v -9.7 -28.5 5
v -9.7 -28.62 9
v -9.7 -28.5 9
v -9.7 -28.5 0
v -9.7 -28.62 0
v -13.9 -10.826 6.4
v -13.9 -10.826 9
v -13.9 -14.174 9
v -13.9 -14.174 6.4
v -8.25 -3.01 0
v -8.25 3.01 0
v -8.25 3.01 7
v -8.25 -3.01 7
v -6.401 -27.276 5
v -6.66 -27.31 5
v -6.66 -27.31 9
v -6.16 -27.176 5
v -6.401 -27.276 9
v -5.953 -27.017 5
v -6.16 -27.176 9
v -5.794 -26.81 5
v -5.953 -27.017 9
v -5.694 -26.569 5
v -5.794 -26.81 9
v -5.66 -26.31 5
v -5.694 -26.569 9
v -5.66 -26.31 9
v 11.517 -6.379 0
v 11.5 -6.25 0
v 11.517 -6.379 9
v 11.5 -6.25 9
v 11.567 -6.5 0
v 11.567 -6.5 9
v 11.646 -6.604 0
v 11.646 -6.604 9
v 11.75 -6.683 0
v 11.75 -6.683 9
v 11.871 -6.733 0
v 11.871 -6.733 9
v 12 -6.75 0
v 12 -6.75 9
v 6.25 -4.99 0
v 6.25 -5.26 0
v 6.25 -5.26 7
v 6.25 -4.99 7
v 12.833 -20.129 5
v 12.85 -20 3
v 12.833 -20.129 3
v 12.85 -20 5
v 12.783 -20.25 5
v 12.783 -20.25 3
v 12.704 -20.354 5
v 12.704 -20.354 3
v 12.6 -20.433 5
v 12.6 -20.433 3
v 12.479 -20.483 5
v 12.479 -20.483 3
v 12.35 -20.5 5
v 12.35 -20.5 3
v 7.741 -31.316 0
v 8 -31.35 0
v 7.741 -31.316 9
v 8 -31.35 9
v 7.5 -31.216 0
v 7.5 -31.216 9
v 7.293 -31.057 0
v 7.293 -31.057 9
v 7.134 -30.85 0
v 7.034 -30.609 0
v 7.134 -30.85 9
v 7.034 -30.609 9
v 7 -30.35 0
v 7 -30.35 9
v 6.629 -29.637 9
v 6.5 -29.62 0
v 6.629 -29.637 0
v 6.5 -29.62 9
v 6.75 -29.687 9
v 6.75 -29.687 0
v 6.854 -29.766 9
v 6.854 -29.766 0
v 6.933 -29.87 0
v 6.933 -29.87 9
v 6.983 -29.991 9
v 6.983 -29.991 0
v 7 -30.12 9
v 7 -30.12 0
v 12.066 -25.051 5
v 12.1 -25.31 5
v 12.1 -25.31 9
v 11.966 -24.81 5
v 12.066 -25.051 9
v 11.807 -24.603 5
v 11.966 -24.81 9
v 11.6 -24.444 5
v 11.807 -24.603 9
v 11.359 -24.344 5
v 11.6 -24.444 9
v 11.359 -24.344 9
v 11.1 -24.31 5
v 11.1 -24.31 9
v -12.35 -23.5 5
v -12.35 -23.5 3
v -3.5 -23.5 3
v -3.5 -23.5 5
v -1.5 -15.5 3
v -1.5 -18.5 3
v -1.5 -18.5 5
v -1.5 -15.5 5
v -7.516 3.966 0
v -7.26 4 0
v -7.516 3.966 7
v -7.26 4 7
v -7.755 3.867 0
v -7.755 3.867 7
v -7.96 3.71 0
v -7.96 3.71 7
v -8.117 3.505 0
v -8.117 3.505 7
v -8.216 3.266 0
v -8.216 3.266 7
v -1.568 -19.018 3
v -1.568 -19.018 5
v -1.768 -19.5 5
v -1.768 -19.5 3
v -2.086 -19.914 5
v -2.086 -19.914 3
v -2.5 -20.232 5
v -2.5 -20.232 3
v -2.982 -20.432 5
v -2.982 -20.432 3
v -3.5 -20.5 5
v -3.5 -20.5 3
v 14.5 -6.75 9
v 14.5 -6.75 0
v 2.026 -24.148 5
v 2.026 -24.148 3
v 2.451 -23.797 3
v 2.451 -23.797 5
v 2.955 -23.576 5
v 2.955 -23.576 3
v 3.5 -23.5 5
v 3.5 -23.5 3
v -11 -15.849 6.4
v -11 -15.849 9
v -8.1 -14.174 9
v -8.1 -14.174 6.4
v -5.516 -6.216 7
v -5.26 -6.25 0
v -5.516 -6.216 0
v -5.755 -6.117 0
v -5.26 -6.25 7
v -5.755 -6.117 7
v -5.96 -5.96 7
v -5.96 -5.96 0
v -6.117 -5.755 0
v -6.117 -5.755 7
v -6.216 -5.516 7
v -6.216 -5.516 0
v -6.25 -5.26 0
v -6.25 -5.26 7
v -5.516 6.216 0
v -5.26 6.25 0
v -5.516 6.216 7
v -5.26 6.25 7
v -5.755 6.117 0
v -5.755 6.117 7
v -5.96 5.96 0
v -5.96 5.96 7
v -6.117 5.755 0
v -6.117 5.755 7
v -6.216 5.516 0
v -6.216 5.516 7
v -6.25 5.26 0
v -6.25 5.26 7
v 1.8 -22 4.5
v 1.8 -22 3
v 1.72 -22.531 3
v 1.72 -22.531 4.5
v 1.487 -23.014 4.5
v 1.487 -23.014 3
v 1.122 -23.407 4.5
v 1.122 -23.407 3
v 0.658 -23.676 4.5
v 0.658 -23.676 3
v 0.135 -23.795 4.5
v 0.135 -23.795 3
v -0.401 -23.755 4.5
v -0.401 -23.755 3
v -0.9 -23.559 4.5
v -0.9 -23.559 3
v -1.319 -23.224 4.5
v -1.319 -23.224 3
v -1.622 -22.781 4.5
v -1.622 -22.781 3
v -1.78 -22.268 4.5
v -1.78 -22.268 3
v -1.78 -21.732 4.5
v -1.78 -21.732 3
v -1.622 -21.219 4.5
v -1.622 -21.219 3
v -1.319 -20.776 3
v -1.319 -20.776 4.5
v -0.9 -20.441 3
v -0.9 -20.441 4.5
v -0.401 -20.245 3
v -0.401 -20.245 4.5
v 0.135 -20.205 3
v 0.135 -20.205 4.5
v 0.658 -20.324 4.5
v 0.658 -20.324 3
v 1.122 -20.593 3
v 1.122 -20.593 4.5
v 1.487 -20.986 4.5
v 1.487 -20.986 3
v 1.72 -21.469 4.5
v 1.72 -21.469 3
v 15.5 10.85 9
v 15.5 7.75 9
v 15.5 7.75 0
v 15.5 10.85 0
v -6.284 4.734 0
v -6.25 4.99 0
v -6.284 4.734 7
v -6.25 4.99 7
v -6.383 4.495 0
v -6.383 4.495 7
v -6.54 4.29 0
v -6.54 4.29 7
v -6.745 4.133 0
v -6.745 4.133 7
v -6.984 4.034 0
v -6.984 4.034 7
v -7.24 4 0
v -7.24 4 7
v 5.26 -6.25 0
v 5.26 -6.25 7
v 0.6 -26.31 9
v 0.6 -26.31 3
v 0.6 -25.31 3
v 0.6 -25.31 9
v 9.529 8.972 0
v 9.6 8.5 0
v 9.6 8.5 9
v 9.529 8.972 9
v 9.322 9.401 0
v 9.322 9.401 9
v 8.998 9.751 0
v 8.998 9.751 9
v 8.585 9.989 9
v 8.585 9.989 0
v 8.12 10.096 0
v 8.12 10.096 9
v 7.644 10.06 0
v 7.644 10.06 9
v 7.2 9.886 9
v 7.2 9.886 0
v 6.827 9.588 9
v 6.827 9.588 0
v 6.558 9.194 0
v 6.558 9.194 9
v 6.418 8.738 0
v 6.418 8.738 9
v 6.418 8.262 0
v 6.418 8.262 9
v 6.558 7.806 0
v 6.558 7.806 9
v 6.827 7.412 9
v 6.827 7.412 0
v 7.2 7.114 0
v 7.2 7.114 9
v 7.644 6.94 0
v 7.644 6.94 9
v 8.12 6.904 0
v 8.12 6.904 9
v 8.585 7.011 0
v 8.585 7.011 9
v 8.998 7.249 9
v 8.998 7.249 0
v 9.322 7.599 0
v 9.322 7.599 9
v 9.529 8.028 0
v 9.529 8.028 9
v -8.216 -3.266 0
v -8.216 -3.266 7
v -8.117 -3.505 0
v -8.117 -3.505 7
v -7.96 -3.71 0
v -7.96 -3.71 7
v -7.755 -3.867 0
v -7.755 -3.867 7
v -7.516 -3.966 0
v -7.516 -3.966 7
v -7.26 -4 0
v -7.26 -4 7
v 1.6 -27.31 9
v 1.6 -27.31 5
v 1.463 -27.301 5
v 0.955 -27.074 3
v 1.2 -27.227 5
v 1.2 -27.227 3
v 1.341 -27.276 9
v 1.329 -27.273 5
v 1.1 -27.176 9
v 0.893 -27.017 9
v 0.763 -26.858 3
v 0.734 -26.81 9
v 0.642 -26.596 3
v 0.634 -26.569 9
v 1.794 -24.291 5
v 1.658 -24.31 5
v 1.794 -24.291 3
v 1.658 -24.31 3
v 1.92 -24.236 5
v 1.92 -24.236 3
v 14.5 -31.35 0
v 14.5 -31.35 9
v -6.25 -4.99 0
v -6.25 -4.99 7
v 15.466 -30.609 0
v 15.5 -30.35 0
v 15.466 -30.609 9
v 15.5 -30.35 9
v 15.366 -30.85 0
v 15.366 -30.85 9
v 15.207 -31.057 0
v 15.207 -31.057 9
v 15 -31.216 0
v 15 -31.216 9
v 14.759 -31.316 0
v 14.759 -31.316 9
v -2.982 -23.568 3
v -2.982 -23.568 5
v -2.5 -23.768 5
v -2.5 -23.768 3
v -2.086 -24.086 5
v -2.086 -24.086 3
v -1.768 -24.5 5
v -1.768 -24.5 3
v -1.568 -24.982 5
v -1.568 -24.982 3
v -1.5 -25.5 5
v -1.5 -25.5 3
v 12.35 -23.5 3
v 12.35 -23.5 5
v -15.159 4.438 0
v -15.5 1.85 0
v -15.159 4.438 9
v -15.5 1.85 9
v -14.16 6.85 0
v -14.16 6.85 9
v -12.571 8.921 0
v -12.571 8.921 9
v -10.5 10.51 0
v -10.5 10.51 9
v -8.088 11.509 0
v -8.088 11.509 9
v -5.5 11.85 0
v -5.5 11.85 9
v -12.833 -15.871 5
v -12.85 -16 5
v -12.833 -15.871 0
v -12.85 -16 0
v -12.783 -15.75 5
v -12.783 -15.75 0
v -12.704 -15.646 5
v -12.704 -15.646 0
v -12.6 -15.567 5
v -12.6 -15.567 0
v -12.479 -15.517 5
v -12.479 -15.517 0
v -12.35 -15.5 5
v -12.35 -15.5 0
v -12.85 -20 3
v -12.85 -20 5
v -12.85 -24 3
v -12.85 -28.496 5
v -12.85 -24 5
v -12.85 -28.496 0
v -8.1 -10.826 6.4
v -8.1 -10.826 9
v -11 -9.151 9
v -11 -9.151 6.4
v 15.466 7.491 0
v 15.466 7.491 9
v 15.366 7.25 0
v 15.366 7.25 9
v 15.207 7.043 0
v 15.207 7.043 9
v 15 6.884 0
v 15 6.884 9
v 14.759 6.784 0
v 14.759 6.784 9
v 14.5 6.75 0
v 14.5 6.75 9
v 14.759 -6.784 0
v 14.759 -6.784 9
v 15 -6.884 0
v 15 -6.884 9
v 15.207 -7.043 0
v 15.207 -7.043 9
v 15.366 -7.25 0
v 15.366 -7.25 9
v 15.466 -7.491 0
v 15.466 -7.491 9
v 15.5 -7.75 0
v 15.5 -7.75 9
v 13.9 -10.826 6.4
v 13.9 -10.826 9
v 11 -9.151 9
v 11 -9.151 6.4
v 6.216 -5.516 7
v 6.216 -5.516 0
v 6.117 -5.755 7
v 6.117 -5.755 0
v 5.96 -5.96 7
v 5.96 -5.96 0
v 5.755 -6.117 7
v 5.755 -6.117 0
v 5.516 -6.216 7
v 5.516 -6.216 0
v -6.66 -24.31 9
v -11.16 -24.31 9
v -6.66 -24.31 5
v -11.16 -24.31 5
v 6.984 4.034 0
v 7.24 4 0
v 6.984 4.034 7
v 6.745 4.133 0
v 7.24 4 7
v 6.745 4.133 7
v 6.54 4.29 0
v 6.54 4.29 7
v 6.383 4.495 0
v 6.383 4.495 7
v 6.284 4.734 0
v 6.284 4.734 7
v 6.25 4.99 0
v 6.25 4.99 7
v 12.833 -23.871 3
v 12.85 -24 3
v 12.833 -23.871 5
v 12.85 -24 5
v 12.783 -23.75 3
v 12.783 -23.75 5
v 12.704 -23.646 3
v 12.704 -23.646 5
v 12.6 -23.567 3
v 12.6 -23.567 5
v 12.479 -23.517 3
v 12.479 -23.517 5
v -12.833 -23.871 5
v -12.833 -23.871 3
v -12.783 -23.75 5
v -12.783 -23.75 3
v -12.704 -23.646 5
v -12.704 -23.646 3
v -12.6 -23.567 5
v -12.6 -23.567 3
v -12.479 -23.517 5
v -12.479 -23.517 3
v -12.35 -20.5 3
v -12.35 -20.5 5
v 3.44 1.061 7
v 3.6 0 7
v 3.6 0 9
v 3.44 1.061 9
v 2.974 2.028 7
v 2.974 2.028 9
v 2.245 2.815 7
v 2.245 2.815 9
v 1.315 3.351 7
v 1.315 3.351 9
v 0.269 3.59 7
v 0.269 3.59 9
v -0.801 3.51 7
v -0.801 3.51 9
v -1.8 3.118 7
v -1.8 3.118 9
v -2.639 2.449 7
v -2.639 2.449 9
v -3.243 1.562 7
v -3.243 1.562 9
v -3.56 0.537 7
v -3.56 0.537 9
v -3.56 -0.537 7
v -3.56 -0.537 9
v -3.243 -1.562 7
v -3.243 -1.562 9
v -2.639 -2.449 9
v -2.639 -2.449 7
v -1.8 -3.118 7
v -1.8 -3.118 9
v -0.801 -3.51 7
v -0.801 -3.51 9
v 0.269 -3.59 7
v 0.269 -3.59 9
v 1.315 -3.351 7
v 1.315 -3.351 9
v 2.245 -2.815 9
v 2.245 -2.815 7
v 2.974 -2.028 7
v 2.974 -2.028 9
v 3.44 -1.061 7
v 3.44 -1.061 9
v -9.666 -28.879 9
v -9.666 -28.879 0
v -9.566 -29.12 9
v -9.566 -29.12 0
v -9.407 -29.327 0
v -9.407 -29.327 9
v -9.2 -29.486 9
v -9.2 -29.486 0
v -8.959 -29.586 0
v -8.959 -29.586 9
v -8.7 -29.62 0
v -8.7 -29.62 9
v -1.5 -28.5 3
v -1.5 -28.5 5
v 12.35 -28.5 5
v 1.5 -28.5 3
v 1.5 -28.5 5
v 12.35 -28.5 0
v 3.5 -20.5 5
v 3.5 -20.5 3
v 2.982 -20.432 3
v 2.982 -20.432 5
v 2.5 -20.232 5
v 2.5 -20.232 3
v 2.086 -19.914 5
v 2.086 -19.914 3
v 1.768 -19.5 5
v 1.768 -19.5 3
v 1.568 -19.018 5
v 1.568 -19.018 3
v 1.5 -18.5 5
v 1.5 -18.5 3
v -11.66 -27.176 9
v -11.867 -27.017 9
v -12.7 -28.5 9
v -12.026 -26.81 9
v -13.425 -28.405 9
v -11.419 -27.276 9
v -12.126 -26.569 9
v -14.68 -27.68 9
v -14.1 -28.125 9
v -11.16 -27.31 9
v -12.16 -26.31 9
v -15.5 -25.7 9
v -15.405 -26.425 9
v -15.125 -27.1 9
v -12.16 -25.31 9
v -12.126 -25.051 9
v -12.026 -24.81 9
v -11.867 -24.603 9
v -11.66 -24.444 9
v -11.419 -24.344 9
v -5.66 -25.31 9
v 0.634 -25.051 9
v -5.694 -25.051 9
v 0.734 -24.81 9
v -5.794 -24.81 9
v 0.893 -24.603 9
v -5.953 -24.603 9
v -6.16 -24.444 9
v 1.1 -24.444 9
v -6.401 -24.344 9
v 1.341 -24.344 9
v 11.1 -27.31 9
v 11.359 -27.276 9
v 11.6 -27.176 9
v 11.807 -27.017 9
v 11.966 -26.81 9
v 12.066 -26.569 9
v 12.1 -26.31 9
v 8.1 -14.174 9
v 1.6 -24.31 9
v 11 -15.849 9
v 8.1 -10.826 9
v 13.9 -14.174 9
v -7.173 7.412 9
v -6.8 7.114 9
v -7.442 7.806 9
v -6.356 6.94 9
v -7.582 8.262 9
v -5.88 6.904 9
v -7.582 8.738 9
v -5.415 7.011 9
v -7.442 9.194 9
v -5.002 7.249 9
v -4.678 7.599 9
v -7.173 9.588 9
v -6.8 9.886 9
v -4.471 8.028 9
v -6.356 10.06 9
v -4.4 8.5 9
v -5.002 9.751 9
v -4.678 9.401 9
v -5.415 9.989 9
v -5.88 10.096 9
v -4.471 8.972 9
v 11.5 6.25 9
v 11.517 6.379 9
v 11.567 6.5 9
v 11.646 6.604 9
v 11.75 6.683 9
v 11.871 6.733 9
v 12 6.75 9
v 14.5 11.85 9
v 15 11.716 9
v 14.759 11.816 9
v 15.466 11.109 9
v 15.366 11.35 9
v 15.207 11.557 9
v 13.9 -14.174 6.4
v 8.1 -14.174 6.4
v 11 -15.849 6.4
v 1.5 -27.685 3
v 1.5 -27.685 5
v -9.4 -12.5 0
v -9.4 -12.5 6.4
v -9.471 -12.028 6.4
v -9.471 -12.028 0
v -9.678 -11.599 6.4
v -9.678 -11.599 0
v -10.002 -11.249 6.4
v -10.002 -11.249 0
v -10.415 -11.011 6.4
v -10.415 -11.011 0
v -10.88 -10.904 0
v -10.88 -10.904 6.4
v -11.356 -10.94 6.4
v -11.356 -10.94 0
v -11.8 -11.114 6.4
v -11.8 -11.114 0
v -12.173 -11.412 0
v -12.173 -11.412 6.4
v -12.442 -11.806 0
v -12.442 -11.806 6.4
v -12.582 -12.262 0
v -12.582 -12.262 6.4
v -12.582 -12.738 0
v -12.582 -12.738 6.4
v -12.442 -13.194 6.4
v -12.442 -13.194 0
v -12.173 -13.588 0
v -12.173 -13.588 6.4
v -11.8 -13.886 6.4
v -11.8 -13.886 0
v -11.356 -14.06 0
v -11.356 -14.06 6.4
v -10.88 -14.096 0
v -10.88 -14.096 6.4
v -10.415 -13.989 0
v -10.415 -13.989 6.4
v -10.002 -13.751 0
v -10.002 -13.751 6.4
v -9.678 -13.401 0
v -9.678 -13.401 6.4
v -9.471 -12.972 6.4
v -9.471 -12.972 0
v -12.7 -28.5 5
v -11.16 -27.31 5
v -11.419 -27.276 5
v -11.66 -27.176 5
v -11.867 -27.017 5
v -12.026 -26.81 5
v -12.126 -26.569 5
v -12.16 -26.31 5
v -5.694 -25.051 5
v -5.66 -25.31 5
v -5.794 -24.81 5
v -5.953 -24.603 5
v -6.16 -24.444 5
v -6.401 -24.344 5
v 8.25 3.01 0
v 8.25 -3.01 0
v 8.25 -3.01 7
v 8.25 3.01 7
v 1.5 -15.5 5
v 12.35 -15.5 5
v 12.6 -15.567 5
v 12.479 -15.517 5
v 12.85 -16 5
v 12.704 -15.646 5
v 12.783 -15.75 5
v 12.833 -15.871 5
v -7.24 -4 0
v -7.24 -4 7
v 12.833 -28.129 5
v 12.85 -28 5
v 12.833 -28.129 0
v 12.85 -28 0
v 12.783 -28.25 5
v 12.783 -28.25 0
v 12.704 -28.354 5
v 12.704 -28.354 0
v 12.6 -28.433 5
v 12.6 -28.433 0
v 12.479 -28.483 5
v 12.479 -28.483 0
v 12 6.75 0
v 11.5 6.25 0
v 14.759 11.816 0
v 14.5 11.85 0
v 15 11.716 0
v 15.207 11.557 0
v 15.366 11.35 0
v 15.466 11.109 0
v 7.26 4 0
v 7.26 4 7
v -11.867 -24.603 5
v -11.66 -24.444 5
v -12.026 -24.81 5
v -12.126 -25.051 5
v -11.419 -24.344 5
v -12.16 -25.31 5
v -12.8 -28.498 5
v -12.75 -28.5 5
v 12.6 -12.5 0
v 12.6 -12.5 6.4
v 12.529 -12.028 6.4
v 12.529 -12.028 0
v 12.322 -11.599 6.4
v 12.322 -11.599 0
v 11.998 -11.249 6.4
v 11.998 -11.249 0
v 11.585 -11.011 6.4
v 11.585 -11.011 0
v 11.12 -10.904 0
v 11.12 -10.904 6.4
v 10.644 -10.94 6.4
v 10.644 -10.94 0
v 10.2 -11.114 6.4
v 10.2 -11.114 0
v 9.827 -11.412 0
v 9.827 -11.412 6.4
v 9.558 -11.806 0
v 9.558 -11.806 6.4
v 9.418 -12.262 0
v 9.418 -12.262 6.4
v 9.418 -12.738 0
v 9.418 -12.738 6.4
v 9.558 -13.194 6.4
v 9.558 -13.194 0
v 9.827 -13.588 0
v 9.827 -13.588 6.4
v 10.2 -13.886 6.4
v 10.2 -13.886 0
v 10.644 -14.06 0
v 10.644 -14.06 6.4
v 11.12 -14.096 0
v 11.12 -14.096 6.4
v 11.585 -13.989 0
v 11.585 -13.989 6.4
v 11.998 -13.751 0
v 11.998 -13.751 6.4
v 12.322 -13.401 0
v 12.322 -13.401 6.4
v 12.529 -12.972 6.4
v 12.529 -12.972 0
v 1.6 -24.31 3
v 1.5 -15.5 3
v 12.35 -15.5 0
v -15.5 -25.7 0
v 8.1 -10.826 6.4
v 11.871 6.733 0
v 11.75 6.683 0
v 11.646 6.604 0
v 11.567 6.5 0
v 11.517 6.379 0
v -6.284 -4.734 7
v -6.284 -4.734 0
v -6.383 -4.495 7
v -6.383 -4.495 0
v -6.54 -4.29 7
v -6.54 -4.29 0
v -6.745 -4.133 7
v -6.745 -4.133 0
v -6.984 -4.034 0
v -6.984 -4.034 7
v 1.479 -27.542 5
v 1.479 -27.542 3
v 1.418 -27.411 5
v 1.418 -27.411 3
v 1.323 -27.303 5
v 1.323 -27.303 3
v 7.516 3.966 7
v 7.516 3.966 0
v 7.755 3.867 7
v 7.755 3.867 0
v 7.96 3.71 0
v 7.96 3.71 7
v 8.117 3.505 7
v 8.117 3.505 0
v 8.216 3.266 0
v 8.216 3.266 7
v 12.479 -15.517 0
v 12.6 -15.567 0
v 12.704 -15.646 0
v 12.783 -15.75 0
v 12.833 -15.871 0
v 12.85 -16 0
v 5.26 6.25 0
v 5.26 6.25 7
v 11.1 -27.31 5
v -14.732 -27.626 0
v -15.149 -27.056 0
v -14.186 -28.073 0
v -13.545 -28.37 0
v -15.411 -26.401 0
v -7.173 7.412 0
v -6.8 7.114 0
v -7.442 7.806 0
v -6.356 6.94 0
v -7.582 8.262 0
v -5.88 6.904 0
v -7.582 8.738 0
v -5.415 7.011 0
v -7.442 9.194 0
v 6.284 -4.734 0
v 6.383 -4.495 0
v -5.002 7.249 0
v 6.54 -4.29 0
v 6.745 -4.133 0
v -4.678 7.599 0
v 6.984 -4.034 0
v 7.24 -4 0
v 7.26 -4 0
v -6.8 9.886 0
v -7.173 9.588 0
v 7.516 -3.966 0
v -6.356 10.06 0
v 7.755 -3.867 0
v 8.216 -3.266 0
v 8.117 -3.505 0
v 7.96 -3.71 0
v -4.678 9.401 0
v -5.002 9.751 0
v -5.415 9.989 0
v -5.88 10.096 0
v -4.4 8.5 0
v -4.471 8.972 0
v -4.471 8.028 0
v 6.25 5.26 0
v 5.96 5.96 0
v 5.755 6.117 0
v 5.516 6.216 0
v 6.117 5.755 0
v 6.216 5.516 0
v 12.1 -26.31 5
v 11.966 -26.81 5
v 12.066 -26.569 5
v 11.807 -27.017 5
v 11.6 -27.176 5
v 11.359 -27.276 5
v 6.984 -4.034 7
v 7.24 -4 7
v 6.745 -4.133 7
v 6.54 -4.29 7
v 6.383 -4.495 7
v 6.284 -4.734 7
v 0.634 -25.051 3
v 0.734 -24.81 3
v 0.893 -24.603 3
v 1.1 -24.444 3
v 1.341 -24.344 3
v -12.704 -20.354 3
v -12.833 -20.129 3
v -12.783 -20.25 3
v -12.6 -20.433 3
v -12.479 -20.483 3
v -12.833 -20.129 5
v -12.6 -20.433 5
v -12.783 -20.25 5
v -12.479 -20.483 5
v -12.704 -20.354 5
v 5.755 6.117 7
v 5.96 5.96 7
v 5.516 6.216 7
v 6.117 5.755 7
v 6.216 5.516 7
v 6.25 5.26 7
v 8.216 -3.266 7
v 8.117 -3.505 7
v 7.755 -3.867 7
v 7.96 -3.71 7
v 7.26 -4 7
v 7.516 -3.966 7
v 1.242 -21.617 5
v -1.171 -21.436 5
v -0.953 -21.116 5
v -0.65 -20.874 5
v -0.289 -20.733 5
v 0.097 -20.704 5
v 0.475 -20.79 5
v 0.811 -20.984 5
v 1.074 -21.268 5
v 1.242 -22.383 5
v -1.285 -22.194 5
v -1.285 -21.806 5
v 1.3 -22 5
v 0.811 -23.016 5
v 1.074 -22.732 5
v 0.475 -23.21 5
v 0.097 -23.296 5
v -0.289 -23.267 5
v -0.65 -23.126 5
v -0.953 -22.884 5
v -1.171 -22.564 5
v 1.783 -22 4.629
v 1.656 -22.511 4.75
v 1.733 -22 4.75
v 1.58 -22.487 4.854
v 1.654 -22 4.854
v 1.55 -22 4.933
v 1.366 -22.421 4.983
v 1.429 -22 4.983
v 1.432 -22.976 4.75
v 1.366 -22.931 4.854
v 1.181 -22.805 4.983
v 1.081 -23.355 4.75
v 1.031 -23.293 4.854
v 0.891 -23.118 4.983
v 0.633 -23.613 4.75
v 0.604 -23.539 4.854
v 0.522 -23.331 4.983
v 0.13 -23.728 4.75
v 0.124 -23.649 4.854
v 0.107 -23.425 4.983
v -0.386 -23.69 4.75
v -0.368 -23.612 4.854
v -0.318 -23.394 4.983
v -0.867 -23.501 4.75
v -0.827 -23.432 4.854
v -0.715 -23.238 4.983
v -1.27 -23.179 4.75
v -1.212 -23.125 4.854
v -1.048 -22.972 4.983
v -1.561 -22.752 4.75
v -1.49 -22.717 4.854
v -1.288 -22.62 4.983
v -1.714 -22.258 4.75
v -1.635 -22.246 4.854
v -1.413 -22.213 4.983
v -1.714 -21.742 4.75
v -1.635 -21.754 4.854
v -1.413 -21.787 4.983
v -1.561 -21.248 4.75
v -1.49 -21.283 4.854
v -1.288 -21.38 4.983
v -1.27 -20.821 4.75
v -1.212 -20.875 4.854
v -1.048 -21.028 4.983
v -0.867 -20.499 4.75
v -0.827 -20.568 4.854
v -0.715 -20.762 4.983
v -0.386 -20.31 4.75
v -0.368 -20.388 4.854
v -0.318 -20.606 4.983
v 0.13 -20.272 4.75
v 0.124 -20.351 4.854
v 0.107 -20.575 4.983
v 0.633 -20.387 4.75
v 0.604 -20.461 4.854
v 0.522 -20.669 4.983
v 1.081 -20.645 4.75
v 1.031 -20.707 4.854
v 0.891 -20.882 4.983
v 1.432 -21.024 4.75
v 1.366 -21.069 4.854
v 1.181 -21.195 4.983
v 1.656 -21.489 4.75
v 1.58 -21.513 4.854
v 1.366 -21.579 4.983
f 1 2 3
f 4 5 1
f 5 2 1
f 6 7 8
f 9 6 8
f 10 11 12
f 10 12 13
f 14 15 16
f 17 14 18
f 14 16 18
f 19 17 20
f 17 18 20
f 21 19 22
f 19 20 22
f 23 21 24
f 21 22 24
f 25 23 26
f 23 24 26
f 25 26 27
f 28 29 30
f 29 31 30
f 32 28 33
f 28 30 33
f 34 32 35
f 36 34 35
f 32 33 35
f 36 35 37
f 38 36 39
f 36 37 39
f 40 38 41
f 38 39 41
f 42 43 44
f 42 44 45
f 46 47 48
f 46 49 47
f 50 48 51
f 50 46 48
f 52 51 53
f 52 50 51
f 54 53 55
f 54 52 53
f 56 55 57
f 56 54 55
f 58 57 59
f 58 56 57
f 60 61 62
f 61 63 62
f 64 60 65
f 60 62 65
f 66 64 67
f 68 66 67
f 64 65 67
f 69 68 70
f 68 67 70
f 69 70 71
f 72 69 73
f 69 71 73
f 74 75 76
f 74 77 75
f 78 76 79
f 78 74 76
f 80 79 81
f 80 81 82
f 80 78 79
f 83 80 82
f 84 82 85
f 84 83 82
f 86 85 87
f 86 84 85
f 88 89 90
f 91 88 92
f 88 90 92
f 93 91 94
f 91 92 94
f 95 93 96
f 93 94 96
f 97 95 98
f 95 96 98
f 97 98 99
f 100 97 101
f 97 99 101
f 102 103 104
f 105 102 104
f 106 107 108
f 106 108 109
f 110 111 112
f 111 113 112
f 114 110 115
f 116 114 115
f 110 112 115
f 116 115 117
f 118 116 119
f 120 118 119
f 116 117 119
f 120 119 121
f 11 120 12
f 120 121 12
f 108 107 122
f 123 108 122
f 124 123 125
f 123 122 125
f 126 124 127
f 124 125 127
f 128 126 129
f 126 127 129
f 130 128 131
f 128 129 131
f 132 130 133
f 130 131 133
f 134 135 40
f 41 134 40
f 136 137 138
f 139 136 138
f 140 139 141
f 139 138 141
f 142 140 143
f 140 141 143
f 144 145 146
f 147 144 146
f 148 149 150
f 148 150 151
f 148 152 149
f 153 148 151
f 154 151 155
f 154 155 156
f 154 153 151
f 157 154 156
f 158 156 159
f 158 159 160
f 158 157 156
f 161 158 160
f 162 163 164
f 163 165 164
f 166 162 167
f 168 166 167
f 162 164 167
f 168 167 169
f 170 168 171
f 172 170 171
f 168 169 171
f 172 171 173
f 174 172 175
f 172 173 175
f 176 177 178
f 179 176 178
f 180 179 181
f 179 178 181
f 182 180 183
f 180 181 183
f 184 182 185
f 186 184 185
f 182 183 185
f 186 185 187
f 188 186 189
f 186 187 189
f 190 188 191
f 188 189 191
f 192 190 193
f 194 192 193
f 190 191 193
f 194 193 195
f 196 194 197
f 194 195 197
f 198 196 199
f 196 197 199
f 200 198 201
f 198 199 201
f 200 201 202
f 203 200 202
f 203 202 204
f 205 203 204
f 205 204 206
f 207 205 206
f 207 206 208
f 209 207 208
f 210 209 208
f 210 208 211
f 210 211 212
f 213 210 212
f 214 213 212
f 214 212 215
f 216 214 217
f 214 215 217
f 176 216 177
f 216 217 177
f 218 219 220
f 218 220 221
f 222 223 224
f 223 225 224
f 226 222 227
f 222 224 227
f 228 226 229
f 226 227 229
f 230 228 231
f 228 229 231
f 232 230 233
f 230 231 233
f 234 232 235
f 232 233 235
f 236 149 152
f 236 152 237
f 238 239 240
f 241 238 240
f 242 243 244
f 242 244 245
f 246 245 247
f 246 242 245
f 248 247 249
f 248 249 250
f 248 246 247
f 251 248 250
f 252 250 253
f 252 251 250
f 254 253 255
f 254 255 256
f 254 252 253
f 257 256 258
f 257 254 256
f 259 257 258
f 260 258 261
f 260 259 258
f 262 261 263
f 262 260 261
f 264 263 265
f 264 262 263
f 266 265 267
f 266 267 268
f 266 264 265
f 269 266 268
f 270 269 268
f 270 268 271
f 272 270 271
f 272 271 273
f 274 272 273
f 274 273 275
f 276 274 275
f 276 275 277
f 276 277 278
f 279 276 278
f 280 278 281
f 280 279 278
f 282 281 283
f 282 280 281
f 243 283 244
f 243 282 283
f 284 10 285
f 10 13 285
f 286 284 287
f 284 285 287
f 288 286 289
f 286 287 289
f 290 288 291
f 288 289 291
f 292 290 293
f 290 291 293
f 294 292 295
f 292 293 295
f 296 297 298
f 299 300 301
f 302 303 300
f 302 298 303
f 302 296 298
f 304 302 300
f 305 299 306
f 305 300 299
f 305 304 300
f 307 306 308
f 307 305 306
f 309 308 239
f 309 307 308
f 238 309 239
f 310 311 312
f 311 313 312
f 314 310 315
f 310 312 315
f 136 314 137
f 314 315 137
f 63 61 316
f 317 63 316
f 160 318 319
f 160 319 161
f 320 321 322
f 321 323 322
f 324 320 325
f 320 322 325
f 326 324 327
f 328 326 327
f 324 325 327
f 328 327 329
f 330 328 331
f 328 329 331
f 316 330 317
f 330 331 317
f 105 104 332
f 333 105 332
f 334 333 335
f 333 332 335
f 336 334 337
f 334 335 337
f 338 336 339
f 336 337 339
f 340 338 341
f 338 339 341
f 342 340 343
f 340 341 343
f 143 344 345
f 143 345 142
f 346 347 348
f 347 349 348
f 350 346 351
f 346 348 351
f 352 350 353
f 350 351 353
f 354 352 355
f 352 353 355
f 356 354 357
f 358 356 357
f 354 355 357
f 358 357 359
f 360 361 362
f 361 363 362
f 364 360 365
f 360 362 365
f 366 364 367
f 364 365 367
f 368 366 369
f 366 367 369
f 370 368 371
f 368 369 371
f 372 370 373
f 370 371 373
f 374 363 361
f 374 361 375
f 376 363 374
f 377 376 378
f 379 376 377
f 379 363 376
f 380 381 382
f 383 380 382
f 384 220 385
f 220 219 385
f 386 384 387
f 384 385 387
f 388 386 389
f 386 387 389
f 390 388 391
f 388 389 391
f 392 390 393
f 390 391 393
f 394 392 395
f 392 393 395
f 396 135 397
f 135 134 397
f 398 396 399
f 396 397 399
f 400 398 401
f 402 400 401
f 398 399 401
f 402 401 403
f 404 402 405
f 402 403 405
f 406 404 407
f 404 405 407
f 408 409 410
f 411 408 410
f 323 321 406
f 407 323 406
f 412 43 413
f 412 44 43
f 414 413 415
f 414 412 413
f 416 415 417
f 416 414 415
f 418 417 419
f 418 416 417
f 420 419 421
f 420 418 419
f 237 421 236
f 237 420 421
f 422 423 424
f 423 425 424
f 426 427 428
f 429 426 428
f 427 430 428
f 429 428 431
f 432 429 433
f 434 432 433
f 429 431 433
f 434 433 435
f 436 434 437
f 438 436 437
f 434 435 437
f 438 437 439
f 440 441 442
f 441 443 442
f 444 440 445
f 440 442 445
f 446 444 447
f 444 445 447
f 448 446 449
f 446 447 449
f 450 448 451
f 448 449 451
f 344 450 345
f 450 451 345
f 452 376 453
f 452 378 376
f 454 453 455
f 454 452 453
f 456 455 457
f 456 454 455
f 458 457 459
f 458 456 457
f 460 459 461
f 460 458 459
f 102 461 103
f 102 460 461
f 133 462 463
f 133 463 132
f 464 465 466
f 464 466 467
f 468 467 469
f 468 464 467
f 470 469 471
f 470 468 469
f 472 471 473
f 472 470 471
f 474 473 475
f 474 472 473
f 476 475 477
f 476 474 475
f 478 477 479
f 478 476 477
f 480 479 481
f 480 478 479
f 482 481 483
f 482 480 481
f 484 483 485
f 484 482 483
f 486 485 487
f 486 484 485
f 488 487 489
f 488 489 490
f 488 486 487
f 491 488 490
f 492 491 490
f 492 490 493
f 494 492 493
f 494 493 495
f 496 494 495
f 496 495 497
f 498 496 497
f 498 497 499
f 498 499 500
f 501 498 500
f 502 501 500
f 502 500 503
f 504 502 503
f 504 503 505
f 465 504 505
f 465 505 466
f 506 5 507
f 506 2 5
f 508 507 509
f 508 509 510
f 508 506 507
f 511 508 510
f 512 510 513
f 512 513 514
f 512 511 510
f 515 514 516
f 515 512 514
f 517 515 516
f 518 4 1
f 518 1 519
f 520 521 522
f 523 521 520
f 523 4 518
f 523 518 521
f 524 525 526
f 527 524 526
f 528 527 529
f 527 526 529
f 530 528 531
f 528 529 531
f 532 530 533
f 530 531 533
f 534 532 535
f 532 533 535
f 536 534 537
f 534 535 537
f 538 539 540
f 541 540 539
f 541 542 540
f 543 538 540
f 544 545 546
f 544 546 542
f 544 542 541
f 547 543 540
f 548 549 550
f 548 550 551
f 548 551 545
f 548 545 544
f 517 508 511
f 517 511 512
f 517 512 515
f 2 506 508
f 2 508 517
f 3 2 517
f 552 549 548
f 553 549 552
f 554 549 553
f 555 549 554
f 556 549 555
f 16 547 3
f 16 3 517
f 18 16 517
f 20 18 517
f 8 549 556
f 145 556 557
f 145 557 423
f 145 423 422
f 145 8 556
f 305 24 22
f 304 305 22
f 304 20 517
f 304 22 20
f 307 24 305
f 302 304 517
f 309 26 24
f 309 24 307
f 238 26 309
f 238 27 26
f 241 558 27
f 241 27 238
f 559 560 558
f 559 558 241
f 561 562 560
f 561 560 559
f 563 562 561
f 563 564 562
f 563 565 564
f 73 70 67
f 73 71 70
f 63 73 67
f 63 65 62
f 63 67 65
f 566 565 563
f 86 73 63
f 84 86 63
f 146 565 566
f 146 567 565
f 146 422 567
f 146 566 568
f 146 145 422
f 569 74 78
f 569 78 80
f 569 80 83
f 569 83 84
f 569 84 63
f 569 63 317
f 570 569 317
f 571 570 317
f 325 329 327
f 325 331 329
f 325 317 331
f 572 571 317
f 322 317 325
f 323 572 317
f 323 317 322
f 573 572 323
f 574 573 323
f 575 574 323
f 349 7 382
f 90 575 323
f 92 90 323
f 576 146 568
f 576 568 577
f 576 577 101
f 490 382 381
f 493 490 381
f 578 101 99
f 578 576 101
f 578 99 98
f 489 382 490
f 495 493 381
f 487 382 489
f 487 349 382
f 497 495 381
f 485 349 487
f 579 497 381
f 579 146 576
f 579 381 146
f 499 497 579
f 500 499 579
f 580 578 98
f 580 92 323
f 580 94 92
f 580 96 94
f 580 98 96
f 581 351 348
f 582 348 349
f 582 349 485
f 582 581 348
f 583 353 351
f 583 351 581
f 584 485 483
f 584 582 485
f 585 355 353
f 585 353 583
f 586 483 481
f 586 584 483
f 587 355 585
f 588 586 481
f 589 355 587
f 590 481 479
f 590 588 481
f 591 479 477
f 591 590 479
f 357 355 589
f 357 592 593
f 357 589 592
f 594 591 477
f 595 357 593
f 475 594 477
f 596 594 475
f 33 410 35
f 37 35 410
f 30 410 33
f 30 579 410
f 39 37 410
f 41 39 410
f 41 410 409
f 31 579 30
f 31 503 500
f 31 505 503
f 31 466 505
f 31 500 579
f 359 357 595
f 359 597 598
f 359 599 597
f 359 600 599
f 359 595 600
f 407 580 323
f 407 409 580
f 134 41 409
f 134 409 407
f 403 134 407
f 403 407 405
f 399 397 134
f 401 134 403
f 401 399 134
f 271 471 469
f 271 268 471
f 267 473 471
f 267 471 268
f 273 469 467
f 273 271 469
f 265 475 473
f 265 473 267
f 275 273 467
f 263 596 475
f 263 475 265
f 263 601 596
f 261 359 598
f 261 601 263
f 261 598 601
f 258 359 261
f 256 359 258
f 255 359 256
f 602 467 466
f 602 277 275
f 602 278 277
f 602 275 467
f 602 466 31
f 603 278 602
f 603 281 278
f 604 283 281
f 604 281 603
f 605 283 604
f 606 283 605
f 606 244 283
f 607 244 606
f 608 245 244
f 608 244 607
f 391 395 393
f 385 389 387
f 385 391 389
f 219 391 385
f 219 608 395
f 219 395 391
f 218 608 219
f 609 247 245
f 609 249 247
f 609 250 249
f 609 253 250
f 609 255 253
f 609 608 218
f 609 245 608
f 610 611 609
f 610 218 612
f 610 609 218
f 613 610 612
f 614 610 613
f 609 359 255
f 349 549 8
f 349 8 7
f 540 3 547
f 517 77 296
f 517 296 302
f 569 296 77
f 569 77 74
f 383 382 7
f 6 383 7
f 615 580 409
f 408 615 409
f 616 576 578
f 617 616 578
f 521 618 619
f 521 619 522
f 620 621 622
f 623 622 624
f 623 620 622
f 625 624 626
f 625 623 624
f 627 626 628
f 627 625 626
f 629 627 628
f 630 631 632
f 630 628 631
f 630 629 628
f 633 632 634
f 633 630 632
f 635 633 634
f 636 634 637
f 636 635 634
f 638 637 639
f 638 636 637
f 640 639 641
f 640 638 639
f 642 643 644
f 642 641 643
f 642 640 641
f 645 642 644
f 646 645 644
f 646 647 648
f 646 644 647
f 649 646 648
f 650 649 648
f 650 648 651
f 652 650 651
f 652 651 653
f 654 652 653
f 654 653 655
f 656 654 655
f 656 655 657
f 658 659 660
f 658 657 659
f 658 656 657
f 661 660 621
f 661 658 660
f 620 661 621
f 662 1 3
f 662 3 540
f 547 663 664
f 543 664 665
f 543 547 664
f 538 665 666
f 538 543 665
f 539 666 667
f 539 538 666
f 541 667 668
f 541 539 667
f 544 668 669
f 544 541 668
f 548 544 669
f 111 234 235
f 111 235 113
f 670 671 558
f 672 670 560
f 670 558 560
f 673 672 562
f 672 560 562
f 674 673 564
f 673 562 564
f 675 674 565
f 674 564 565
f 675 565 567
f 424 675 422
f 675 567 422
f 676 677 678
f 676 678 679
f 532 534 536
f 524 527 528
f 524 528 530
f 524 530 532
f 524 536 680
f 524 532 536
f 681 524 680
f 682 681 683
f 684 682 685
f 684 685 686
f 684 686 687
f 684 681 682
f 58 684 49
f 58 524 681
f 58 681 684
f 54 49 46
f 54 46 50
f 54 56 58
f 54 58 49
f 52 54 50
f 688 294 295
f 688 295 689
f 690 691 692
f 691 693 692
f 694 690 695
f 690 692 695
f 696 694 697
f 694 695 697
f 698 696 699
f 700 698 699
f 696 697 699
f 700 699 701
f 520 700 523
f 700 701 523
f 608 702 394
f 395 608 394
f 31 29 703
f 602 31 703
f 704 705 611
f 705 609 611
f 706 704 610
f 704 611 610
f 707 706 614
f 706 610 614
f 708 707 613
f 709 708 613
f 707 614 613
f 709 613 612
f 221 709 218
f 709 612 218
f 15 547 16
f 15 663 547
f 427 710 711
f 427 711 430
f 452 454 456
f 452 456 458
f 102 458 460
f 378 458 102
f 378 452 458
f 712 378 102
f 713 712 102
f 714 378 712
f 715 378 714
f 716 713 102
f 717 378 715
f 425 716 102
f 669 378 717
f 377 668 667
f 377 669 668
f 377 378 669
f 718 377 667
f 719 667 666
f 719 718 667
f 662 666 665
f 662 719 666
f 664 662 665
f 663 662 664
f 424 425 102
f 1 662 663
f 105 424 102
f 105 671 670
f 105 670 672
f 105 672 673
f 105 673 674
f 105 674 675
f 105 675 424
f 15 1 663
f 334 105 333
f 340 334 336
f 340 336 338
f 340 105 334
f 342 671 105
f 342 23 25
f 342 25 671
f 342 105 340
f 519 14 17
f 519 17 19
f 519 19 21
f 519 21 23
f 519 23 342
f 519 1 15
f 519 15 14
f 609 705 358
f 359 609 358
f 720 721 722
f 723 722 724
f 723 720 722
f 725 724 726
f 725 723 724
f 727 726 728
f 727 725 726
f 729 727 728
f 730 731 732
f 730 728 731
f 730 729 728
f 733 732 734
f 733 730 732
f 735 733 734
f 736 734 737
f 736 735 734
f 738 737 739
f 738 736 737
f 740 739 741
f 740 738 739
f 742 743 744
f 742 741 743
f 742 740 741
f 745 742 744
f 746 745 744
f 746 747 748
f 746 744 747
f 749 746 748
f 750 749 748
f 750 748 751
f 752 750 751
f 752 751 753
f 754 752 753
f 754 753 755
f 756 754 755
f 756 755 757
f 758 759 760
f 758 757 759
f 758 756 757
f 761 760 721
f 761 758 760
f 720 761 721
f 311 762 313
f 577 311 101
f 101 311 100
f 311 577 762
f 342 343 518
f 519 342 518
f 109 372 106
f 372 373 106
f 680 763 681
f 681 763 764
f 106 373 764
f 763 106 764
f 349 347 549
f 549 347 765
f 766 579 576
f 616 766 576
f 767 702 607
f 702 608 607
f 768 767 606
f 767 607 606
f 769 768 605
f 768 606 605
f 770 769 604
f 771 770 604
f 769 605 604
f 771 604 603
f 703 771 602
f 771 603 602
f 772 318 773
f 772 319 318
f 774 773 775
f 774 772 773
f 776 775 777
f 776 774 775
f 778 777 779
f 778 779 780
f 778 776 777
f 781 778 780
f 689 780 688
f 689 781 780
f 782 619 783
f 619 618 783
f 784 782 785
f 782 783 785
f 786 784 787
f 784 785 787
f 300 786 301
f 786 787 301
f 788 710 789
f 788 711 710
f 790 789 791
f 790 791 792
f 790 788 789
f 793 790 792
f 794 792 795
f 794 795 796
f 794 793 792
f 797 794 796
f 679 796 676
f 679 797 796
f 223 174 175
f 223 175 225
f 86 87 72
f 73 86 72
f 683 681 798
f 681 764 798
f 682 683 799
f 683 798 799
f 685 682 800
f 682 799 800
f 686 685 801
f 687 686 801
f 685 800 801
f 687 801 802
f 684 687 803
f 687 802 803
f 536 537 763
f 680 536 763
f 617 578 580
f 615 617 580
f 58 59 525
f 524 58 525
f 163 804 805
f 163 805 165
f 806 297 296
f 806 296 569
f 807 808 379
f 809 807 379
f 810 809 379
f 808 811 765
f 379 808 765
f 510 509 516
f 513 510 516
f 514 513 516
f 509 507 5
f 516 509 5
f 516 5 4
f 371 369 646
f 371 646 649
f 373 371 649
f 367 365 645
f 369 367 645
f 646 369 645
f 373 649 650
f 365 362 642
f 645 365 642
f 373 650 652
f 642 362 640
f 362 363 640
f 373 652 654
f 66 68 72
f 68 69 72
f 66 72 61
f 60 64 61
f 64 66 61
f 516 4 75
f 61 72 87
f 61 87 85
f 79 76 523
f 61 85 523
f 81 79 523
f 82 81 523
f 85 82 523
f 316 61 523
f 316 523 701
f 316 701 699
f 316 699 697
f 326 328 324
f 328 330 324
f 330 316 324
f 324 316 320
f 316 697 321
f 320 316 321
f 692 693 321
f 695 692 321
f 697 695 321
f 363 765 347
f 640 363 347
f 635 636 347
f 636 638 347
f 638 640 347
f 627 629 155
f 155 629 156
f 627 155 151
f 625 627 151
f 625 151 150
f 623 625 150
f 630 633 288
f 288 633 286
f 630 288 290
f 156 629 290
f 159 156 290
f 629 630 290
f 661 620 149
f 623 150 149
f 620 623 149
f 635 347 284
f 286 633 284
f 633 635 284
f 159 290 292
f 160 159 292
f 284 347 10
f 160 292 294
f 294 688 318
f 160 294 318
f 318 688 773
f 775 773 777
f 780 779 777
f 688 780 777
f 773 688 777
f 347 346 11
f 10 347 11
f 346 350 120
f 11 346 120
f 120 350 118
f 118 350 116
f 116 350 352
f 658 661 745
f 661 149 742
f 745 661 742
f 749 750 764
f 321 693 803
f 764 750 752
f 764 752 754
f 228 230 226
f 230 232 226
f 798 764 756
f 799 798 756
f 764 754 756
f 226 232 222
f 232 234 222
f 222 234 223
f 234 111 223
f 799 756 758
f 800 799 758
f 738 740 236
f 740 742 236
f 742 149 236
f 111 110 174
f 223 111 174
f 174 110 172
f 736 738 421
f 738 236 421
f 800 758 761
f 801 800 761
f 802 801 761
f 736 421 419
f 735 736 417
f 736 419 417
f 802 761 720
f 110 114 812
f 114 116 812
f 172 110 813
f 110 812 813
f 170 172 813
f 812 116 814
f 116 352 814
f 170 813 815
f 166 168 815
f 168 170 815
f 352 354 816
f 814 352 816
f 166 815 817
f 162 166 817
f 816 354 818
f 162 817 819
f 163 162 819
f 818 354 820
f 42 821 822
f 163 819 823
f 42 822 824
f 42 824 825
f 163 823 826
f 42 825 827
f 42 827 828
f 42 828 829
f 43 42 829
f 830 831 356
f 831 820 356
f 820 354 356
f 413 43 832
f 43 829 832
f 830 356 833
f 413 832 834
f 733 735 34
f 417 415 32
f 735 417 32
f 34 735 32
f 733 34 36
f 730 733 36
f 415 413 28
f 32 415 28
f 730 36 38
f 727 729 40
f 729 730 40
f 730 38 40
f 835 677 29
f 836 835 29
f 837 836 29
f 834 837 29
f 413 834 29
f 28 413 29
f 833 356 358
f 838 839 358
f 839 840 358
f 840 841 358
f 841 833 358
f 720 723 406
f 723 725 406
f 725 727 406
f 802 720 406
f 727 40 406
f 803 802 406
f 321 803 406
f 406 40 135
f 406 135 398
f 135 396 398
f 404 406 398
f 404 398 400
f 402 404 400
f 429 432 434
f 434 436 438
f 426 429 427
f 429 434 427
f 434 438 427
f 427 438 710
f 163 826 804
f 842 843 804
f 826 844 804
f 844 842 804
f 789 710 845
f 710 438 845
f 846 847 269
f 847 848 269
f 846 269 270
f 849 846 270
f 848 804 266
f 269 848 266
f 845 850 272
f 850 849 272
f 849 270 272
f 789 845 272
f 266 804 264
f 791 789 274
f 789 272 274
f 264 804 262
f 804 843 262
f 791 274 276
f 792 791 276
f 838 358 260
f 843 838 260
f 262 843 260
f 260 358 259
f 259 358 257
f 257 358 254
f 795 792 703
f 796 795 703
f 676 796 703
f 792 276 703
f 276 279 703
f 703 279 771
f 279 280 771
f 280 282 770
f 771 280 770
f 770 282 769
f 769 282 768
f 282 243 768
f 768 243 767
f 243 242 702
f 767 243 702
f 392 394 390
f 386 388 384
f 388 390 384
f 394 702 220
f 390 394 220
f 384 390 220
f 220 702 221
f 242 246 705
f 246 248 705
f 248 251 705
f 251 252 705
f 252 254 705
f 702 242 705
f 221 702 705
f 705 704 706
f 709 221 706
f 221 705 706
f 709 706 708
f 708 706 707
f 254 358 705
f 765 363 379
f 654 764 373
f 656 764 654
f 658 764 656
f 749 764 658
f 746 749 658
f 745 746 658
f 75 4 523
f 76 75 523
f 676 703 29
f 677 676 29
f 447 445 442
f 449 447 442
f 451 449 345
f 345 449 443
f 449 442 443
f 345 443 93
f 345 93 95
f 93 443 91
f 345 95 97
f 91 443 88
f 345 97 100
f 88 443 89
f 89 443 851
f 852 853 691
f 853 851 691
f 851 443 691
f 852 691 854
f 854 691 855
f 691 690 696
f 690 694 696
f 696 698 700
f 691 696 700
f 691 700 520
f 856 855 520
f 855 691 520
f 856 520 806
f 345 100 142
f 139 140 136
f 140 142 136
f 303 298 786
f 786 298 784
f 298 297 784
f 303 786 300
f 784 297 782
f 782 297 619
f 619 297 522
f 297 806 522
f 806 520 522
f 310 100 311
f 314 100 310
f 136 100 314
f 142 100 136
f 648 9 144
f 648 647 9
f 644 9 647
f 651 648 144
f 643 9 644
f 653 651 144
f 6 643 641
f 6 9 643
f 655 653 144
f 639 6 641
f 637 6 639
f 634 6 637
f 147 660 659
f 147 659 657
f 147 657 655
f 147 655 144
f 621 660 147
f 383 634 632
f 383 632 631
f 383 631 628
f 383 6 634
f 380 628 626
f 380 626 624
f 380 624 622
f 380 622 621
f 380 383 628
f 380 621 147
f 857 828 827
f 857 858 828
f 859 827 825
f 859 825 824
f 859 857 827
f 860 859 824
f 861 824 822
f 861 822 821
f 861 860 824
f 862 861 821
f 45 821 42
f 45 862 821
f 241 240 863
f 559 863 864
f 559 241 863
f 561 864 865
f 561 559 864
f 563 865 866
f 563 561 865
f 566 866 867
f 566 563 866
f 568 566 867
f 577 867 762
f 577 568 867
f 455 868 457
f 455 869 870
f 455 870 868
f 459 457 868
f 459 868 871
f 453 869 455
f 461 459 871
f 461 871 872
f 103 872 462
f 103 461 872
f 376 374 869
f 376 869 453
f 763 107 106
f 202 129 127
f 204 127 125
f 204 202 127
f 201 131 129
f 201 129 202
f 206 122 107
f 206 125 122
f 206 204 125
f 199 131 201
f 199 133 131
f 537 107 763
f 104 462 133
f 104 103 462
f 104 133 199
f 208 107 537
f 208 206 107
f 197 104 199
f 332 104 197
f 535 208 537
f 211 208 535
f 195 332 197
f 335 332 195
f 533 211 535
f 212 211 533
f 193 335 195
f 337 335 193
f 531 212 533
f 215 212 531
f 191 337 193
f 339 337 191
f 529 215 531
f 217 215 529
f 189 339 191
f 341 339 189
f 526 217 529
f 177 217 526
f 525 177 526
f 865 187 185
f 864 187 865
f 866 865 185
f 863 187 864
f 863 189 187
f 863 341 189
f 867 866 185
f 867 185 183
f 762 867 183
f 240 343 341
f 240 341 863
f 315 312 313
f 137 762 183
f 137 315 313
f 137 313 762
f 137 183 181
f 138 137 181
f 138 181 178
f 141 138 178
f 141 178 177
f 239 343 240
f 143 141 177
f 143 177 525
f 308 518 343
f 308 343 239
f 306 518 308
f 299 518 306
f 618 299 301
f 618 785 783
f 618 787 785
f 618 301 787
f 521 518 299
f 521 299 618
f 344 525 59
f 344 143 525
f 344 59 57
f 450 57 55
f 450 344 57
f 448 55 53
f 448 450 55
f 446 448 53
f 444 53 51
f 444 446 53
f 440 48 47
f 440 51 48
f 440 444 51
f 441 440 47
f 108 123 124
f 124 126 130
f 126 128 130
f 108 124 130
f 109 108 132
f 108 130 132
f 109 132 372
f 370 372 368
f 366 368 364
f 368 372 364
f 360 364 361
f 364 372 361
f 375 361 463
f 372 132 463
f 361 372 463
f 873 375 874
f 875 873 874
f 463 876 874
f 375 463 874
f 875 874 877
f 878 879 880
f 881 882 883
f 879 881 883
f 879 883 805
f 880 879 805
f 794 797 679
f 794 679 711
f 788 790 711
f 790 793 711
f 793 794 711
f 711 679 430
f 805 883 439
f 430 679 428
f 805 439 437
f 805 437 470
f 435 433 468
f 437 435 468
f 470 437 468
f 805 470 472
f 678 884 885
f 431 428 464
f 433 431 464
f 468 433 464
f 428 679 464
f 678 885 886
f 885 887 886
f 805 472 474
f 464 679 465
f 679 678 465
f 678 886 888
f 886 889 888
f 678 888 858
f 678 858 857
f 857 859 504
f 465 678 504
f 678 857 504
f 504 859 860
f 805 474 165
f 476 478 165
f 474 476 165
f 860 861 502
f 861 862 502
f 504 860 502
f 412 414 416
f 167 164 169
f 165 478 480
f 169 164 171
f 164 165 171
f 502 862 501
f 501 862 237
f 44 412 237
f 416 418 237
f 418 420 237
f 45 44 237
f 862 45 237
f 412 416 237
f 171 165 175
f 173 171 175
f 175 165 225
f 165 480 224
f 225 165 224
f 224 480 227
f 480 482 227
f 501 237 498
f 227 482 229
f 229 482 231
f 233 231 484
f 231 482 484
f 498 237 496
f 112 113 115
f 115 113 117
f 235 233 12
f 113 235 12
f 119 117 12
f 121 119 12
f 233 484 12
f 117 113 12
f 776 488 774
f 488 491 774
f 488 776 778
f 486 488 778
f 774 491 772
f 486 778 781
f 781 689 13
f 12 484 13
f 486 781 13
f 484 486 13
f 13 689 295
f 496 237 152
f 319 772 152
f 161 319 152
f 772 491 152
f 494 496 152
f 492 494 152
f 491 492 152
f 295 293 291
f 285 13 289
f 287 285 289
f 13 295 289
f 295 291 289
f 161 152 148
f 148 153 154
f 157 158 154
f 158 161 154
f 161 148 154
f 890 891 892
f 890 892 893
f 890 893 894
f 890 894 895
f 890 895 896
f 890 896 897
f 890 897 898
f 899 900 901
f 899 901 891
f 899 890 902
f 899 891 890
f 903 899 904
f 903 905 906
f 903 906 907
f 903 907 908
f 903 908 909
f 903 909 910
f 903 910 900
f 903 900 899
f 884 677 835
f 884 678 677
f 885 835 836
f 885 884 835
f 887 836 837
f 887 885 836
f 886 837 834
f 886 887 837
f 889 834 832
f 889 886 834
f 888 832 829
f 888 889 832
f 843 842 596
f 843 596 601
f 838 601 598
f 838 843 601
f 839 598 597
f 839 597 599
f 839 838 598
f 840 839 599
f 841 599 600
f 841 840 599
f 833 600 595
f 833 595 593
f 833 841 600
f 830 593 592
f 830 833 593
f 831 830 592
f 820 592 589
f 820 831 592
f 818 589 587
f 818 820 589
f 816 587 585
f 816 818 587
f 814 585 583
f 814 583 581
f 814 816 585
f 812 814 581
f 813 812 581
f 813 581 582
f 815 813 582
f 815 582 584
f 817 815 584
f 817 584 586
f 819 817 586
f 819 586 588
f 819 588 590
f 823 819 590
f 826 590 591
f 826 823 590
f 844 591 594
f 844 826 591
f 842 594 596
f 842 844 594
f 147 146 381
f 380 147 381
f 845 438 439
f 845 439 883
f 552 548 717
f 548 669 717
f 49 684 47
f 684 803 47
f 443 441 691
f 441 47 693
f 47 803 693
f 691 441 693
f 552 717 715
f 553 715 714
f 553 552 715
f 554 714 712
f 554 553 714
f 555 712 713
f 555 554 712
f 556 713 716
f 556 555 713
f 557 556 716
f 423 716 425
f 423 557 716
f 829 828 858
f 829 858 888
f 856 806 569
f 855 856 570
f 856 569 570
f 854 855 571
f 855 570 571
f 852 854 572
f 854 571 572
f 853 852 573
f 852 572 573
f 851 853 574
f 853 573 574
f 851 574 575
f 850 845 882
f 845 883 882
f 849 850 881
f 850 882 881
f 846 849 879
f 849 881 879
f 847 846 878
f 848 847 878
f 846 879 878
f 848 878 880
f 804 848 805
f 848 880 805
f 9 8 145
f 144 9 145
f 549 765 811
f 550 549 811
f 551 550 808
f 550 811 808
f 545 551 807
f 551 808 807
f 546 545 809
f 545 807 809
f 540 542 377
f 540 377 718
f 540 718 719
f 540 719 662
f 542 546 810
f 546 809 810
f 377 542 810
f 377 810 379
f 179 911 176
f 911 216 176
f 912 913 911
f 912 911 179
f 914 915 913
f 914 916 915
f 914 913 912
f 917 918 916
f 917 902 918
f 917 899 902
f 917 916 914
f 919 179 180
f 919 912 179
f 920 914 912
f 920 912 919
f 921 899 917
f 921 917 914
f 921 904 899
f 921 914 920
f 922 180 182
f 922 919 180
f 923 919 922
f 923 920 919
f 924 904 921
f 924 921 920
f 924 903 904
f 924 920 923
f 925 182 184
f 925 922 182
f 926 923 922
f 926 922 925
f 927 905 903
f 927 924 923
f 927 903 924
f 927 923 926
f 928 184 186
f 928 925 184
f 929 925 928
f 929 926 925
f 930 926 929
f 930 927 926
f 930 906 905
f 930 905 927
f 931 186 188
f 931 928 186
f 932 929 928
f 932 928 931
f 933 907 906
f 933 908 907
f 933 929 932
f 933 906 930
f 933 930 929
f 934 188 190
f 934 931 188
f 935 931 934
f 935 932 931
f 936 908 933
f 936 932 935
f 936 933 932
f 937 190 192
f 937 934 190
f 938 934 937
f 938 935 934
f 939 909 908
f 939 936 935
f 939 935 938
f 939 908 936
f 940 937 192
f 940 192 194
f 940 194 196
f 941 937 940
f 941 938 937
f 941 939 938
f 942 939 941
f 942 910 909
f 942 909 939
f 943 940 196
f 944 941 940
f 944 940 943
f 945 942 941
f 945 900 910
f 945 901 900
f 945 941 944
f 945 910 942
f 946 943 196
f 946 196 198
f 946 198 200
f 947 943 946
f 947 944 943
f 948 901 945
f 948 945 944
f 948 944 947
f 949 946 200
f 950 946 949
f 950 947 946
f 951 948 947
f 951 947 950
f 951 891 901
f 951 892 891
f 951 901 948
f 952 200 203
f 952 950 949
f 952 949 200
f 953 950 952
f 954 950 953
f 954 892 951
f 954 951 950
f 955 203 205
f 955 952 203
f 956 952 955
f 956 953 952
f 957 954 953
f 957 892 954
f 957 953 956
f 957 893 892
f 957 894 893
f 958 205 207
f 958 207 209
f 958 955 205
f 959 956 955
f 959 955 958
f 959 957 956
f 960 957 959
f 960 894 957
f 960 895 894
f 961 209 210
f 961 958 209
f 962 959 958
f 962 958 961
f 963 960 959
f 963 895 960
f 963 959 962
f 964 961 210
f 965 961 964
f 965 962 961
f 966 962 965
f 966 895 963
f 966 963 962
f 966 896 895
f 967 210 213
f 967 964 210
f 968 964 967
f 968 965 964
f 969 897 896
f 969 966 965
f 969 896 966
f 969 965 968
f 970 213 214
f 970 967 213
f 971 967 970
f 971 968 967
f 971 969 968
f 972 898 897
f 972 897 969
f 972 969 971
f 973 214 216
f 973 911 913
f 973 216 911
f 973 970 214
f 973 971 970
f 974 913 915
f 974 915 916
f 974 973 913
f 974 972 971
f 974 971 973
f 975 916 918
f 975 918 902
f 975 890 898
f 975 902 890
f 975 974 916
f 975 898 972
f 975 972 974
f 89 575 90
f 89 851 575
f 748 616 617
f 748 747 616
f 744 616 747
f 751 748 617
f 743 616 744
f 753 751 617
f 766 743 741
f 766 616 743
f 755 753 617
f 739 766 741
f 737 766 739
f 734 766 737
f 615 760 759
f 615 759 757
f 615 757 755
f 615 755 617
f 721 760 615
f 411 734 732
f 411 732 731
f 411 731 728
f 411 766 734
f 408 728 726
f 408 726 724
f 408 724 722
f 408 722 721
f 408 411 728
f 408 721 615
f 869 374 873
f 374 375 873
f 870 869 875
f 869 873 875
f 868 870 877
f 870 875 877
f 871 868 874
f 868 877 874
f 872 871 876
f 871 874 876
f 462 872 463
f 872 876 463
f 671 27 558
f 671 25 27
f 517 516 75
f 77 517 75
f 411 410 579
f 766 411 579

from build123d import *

# Parameters (mm, degrees)
SKETCH_R        = 3.6
SKETCH_R_2      = 1.6
SKETCH_W        = 6.5
SKETCH_H        = 3
SKETCH_W_2      = 11.5
PAD_DEPTH       = 9
POCKET_DEPTH    = 2.6
POCKET001_DEPTH = 7
SKETCH003_W     = 25.7
SKETCH003_H     = 13
POCKET002_DEPTH = 3
SKETCH004_R     = 1.8
POCKET003_DEPTH = 2
FILLET_R        = 10
FILLET001_R     = 0.99
FILLET002_R     = 1
FILLET003_R     = 0.5


with BuildPart() as part:
    # Sketch → Pad (new body)
    with BuildSketch(Plane.XY):
        with BuildLine():
            Line((15.5, -31.35), (15.5, -6.75))
            Line((15.5, -6.75), (11.5, -6.75))
            Line((11.5, -6.75), (11.5, 6.75))
            Line((11.5, 6.75), (15.5, 6.75))
            Line((15.5, 6.75), (15.5, 11.85))
            Line((15.5, 11.85), (-15.5, 11.85))
            Line((-15.5, 11.85), (-15.5, -25.7))
            ThreePointArc((-15.5, -25.7), (-14.679899, -27.679899), (-12.7, -28.5))
            Line((-9.7, -28.5), (-12.7, -28.5))
            Line((-9.7, -29.62), (-9.7, -28.5))
            Line((-9.7, -29.62), (7, -29.62))
            Line((7, -29.62), (7, -31.35))
            Line((7, -31.35), (15.5, -31.35))
        make_face()
        Circle(SKETCH_R, mode=Mode.SUBTRACT)
        with Locations((-11, -12.5)):
            Circle(SKETCH_R_2, mode=Mode.SUBTRACT)
        with Locations((11, -12.5)):
            Circle(SKETCH_R_2, mode=Mode.SUBTRACT)
        with Locations((-6, 8.5)):
            Circle(SKETCH_R_2, mode=Mode.SUBTRACT)
        with Locations((8, 8.5)):
            Circle(SKETCH_R_2, mode=Mode.SUBTRACT)
        with Locations((-8.91, -25.81)):
            Rectangle(SKETCH_W, SKETCH_H, mode=Mode.SUBTRACT)
        with Locations((6.35, -25.81)):
            Rectangle(SKETCH_W_2, SKETCH_H, mode=Mode.SUBTRACT)
    extrude(amount=PAD_DEPTH)

    # Sketch001 (on Face28 of Pad) → Pocket (cut)
    with BuildSketch(Plane.XY.offset(9)):
        Polygon((-8.1, -14.174316), (-8.1, -10.825684), (-11, -9.151368), (-13.9, -10.825684), (-13.9, -14.174316), (-11, -15.848632), align=None)
        Polygon((13.9, -14.174316), (13.9, -10.825684), (11, -9.151368), (8.1, -10.825684), (8.1, -14.174316), (11, -15.848632), align=None)
    extrude(amount=-POCKET_DEPTH, mode=Mode.SUBTRACT)

    # Sketch002 → Pocket001 (cut)
    with BuildSketch(Plane(origin=(0, 0, 0), x_dir=(1, 0, 0), z_dir=(0, 0, -1))):
        Polygon((8.25, -4), (6.25, -4), (6.25, -6.25), (-6.25, -6.25), (-6.25, -4), (-8.25, -4), (-8.25, 4), (-6.25, 4), (-6.25, 6.25), (6.25, 6.25), (6.25, 4), (8.25, 4), align=None)
    extrude(amount=-POCKET001_DEPTH, mode=Mode.SUBTRACT)

    # Sketch003 → Pocket002 (cut)
    with BuildSketch(Plane(origin=(0, 0, 0), x_dir=(1, 0, 0), z_dir=(0, 0, -1))):
        with Locations((0, 22)):
            Rectangle(SKETCH003_W, SKETCH003_H)
    extrude(amount=-POCKET002_DEPTH, mode=Mode.SUBTRACT)

    # Sketch004 (on Face57 of Pocket002) → Pocket003 (cut)
    with BuildSketch(Plane(origin=(0, 0, 3), x_dir=(1, 0, 0), z_dir=(0, 0, -1))):
        with Locations((0, 22)):
            Circle(SKETCH004_R)
        with BuildLine():
            Line((1.5, 15.5), (12.85, 15.5))
            Line((12.85, 15.5), (12.85, 20.5))
            Line((12.85, 20.5), (3.5, 20.5))
            ThreePointArc((3.5, 20.5), (2.085786, 19.914214), (1.5, 18.5))
            Line((1.5, 18.5), (1.5, 15.5))
        make_face()
        with BuildLine():
            Line((-1.5, 15.5), (-12.85, 15.5))
            Line((-12.85, 15.5), (-12.85, 20.5))
            Line((-12.85, 20.5), (-3.5, 20.5))
            ThreePointArc((-1.5, 18.5), (-2.085786, 19.914214), (-3.5, 20.5))
            Line((-1.5, 18.5), (-1.5, 15.5))
        make_face()
        with BuildLine():
            Line((12.85, 23.5), (3.5, 23.5))
            ThreePointArc((1.5, 25.5), (2.085786, 24.085786), (3.5, 23.5))
            Line((1.5, 25.5), (1.5, 28.5))
            Line((1.5, 28.5), (12.85, 28.5))
            Line((12.85, 28.5), (12.85, 23.5))
        make_face()
        with BuildLine():
            Line((-12.85, 23.5), (-3.5, 23.5))
            ThreePointArc((-3.5, 23.5), (-2.085786, 24.085786), (-1.5, 25.5))
            Line((-1.5, 25.5), (-1.5, 28.5))
            Line((-1.5, 28.5), (-12.85, 28.5))
            Line((-12.85, 28.5), (-12.85, 23.5))
        make_face()
    extrude(amount=-POCKET003_DEPTH, mode=Mode.SUBTRACT)

    # Fillet
    fillet_edges = [part.edges().sort_by_distance(p)[0] for p in [
        (-15.5, 11.85, 4.5),
    ]]
    fillet(fillet_edges, radius=FILLET_R)

    # Fillet001
    fillet001_edges = [part.edges().sort_by_distance(p)[0] for p in [
        (6.25, -4, 3.5),
        (6.25, -6.25, 3.5),
        (8.25, -4, 3.5),
        (8.25, 4, 3.5),
        (6.25, 4, 3.5),
        (6.25, 6.25, 3.5),
        (-6.25, 6.25, 3.5),
        (-6.25, 4, 3.5),
        (-8.25, 4, 3.5),
        (-8.25, -4, 3.5),
        (-6.25, -4, 3.5),
        (-6.25, -6.25, 3.5),
    ]]
    fillet(fillet001_edges, radius=FILLET001_R)

    # Fillet002
    fillet002_edges = [part.edges().sort_by_distance(p)[0] for p in [
        (15.5, 11.85, 4.5),
        (15.5, -6.75, 4.5),
        (15.5, 6.75, 4.5),
        (15.5, -31.35, 4.5),
        (7, -31.35, 4.5),
        (-9.7, -29.62, 4.5),
        (0.6, -27.31, 6),
        (-12.16, -27.31, 7),
        (-5.66, -27.31, 7),
        (12.1, -27.31, 7),
        (-12.16, -24.31, 7),
        (-5.66, -24.31, 7),
        (12.1, -24.31, 7),
        (0.6, -24.31, 6),
    ]]
    fillet(fillet002_edges, radius=FILLET002_R)

    # Fillet003
    fillet003_edges = [part.edges().sort_by_distance(p)[0] for p in [
        (11.5, 6.75, 4.5),
        (11.5, -6.75, 4.5),
        (7, -29.62, 4.5),
        (12.85, -15.5, 1.5),
        (12.85, -15.5, 4),
        (12.85, -23.5, 4),
        (12.85, -20.5, 4),
        (12.85, -28.5, 1.5),
        (12.85, -28.5, 4),
        (-12.85, -15.5, 1.5),
        (-12.85, -15.5, 4),
        (-12.85, -23.5, 4),
        (-12.85, -20.5, 4),
        (1.5, -27.304987, 4),
        (1.892549, -24.31, 4),
        (-1.8, -22, 5),
    ]]
    fillet(fillet003_edges, radius=FILLET003_R)


solid = part.part
